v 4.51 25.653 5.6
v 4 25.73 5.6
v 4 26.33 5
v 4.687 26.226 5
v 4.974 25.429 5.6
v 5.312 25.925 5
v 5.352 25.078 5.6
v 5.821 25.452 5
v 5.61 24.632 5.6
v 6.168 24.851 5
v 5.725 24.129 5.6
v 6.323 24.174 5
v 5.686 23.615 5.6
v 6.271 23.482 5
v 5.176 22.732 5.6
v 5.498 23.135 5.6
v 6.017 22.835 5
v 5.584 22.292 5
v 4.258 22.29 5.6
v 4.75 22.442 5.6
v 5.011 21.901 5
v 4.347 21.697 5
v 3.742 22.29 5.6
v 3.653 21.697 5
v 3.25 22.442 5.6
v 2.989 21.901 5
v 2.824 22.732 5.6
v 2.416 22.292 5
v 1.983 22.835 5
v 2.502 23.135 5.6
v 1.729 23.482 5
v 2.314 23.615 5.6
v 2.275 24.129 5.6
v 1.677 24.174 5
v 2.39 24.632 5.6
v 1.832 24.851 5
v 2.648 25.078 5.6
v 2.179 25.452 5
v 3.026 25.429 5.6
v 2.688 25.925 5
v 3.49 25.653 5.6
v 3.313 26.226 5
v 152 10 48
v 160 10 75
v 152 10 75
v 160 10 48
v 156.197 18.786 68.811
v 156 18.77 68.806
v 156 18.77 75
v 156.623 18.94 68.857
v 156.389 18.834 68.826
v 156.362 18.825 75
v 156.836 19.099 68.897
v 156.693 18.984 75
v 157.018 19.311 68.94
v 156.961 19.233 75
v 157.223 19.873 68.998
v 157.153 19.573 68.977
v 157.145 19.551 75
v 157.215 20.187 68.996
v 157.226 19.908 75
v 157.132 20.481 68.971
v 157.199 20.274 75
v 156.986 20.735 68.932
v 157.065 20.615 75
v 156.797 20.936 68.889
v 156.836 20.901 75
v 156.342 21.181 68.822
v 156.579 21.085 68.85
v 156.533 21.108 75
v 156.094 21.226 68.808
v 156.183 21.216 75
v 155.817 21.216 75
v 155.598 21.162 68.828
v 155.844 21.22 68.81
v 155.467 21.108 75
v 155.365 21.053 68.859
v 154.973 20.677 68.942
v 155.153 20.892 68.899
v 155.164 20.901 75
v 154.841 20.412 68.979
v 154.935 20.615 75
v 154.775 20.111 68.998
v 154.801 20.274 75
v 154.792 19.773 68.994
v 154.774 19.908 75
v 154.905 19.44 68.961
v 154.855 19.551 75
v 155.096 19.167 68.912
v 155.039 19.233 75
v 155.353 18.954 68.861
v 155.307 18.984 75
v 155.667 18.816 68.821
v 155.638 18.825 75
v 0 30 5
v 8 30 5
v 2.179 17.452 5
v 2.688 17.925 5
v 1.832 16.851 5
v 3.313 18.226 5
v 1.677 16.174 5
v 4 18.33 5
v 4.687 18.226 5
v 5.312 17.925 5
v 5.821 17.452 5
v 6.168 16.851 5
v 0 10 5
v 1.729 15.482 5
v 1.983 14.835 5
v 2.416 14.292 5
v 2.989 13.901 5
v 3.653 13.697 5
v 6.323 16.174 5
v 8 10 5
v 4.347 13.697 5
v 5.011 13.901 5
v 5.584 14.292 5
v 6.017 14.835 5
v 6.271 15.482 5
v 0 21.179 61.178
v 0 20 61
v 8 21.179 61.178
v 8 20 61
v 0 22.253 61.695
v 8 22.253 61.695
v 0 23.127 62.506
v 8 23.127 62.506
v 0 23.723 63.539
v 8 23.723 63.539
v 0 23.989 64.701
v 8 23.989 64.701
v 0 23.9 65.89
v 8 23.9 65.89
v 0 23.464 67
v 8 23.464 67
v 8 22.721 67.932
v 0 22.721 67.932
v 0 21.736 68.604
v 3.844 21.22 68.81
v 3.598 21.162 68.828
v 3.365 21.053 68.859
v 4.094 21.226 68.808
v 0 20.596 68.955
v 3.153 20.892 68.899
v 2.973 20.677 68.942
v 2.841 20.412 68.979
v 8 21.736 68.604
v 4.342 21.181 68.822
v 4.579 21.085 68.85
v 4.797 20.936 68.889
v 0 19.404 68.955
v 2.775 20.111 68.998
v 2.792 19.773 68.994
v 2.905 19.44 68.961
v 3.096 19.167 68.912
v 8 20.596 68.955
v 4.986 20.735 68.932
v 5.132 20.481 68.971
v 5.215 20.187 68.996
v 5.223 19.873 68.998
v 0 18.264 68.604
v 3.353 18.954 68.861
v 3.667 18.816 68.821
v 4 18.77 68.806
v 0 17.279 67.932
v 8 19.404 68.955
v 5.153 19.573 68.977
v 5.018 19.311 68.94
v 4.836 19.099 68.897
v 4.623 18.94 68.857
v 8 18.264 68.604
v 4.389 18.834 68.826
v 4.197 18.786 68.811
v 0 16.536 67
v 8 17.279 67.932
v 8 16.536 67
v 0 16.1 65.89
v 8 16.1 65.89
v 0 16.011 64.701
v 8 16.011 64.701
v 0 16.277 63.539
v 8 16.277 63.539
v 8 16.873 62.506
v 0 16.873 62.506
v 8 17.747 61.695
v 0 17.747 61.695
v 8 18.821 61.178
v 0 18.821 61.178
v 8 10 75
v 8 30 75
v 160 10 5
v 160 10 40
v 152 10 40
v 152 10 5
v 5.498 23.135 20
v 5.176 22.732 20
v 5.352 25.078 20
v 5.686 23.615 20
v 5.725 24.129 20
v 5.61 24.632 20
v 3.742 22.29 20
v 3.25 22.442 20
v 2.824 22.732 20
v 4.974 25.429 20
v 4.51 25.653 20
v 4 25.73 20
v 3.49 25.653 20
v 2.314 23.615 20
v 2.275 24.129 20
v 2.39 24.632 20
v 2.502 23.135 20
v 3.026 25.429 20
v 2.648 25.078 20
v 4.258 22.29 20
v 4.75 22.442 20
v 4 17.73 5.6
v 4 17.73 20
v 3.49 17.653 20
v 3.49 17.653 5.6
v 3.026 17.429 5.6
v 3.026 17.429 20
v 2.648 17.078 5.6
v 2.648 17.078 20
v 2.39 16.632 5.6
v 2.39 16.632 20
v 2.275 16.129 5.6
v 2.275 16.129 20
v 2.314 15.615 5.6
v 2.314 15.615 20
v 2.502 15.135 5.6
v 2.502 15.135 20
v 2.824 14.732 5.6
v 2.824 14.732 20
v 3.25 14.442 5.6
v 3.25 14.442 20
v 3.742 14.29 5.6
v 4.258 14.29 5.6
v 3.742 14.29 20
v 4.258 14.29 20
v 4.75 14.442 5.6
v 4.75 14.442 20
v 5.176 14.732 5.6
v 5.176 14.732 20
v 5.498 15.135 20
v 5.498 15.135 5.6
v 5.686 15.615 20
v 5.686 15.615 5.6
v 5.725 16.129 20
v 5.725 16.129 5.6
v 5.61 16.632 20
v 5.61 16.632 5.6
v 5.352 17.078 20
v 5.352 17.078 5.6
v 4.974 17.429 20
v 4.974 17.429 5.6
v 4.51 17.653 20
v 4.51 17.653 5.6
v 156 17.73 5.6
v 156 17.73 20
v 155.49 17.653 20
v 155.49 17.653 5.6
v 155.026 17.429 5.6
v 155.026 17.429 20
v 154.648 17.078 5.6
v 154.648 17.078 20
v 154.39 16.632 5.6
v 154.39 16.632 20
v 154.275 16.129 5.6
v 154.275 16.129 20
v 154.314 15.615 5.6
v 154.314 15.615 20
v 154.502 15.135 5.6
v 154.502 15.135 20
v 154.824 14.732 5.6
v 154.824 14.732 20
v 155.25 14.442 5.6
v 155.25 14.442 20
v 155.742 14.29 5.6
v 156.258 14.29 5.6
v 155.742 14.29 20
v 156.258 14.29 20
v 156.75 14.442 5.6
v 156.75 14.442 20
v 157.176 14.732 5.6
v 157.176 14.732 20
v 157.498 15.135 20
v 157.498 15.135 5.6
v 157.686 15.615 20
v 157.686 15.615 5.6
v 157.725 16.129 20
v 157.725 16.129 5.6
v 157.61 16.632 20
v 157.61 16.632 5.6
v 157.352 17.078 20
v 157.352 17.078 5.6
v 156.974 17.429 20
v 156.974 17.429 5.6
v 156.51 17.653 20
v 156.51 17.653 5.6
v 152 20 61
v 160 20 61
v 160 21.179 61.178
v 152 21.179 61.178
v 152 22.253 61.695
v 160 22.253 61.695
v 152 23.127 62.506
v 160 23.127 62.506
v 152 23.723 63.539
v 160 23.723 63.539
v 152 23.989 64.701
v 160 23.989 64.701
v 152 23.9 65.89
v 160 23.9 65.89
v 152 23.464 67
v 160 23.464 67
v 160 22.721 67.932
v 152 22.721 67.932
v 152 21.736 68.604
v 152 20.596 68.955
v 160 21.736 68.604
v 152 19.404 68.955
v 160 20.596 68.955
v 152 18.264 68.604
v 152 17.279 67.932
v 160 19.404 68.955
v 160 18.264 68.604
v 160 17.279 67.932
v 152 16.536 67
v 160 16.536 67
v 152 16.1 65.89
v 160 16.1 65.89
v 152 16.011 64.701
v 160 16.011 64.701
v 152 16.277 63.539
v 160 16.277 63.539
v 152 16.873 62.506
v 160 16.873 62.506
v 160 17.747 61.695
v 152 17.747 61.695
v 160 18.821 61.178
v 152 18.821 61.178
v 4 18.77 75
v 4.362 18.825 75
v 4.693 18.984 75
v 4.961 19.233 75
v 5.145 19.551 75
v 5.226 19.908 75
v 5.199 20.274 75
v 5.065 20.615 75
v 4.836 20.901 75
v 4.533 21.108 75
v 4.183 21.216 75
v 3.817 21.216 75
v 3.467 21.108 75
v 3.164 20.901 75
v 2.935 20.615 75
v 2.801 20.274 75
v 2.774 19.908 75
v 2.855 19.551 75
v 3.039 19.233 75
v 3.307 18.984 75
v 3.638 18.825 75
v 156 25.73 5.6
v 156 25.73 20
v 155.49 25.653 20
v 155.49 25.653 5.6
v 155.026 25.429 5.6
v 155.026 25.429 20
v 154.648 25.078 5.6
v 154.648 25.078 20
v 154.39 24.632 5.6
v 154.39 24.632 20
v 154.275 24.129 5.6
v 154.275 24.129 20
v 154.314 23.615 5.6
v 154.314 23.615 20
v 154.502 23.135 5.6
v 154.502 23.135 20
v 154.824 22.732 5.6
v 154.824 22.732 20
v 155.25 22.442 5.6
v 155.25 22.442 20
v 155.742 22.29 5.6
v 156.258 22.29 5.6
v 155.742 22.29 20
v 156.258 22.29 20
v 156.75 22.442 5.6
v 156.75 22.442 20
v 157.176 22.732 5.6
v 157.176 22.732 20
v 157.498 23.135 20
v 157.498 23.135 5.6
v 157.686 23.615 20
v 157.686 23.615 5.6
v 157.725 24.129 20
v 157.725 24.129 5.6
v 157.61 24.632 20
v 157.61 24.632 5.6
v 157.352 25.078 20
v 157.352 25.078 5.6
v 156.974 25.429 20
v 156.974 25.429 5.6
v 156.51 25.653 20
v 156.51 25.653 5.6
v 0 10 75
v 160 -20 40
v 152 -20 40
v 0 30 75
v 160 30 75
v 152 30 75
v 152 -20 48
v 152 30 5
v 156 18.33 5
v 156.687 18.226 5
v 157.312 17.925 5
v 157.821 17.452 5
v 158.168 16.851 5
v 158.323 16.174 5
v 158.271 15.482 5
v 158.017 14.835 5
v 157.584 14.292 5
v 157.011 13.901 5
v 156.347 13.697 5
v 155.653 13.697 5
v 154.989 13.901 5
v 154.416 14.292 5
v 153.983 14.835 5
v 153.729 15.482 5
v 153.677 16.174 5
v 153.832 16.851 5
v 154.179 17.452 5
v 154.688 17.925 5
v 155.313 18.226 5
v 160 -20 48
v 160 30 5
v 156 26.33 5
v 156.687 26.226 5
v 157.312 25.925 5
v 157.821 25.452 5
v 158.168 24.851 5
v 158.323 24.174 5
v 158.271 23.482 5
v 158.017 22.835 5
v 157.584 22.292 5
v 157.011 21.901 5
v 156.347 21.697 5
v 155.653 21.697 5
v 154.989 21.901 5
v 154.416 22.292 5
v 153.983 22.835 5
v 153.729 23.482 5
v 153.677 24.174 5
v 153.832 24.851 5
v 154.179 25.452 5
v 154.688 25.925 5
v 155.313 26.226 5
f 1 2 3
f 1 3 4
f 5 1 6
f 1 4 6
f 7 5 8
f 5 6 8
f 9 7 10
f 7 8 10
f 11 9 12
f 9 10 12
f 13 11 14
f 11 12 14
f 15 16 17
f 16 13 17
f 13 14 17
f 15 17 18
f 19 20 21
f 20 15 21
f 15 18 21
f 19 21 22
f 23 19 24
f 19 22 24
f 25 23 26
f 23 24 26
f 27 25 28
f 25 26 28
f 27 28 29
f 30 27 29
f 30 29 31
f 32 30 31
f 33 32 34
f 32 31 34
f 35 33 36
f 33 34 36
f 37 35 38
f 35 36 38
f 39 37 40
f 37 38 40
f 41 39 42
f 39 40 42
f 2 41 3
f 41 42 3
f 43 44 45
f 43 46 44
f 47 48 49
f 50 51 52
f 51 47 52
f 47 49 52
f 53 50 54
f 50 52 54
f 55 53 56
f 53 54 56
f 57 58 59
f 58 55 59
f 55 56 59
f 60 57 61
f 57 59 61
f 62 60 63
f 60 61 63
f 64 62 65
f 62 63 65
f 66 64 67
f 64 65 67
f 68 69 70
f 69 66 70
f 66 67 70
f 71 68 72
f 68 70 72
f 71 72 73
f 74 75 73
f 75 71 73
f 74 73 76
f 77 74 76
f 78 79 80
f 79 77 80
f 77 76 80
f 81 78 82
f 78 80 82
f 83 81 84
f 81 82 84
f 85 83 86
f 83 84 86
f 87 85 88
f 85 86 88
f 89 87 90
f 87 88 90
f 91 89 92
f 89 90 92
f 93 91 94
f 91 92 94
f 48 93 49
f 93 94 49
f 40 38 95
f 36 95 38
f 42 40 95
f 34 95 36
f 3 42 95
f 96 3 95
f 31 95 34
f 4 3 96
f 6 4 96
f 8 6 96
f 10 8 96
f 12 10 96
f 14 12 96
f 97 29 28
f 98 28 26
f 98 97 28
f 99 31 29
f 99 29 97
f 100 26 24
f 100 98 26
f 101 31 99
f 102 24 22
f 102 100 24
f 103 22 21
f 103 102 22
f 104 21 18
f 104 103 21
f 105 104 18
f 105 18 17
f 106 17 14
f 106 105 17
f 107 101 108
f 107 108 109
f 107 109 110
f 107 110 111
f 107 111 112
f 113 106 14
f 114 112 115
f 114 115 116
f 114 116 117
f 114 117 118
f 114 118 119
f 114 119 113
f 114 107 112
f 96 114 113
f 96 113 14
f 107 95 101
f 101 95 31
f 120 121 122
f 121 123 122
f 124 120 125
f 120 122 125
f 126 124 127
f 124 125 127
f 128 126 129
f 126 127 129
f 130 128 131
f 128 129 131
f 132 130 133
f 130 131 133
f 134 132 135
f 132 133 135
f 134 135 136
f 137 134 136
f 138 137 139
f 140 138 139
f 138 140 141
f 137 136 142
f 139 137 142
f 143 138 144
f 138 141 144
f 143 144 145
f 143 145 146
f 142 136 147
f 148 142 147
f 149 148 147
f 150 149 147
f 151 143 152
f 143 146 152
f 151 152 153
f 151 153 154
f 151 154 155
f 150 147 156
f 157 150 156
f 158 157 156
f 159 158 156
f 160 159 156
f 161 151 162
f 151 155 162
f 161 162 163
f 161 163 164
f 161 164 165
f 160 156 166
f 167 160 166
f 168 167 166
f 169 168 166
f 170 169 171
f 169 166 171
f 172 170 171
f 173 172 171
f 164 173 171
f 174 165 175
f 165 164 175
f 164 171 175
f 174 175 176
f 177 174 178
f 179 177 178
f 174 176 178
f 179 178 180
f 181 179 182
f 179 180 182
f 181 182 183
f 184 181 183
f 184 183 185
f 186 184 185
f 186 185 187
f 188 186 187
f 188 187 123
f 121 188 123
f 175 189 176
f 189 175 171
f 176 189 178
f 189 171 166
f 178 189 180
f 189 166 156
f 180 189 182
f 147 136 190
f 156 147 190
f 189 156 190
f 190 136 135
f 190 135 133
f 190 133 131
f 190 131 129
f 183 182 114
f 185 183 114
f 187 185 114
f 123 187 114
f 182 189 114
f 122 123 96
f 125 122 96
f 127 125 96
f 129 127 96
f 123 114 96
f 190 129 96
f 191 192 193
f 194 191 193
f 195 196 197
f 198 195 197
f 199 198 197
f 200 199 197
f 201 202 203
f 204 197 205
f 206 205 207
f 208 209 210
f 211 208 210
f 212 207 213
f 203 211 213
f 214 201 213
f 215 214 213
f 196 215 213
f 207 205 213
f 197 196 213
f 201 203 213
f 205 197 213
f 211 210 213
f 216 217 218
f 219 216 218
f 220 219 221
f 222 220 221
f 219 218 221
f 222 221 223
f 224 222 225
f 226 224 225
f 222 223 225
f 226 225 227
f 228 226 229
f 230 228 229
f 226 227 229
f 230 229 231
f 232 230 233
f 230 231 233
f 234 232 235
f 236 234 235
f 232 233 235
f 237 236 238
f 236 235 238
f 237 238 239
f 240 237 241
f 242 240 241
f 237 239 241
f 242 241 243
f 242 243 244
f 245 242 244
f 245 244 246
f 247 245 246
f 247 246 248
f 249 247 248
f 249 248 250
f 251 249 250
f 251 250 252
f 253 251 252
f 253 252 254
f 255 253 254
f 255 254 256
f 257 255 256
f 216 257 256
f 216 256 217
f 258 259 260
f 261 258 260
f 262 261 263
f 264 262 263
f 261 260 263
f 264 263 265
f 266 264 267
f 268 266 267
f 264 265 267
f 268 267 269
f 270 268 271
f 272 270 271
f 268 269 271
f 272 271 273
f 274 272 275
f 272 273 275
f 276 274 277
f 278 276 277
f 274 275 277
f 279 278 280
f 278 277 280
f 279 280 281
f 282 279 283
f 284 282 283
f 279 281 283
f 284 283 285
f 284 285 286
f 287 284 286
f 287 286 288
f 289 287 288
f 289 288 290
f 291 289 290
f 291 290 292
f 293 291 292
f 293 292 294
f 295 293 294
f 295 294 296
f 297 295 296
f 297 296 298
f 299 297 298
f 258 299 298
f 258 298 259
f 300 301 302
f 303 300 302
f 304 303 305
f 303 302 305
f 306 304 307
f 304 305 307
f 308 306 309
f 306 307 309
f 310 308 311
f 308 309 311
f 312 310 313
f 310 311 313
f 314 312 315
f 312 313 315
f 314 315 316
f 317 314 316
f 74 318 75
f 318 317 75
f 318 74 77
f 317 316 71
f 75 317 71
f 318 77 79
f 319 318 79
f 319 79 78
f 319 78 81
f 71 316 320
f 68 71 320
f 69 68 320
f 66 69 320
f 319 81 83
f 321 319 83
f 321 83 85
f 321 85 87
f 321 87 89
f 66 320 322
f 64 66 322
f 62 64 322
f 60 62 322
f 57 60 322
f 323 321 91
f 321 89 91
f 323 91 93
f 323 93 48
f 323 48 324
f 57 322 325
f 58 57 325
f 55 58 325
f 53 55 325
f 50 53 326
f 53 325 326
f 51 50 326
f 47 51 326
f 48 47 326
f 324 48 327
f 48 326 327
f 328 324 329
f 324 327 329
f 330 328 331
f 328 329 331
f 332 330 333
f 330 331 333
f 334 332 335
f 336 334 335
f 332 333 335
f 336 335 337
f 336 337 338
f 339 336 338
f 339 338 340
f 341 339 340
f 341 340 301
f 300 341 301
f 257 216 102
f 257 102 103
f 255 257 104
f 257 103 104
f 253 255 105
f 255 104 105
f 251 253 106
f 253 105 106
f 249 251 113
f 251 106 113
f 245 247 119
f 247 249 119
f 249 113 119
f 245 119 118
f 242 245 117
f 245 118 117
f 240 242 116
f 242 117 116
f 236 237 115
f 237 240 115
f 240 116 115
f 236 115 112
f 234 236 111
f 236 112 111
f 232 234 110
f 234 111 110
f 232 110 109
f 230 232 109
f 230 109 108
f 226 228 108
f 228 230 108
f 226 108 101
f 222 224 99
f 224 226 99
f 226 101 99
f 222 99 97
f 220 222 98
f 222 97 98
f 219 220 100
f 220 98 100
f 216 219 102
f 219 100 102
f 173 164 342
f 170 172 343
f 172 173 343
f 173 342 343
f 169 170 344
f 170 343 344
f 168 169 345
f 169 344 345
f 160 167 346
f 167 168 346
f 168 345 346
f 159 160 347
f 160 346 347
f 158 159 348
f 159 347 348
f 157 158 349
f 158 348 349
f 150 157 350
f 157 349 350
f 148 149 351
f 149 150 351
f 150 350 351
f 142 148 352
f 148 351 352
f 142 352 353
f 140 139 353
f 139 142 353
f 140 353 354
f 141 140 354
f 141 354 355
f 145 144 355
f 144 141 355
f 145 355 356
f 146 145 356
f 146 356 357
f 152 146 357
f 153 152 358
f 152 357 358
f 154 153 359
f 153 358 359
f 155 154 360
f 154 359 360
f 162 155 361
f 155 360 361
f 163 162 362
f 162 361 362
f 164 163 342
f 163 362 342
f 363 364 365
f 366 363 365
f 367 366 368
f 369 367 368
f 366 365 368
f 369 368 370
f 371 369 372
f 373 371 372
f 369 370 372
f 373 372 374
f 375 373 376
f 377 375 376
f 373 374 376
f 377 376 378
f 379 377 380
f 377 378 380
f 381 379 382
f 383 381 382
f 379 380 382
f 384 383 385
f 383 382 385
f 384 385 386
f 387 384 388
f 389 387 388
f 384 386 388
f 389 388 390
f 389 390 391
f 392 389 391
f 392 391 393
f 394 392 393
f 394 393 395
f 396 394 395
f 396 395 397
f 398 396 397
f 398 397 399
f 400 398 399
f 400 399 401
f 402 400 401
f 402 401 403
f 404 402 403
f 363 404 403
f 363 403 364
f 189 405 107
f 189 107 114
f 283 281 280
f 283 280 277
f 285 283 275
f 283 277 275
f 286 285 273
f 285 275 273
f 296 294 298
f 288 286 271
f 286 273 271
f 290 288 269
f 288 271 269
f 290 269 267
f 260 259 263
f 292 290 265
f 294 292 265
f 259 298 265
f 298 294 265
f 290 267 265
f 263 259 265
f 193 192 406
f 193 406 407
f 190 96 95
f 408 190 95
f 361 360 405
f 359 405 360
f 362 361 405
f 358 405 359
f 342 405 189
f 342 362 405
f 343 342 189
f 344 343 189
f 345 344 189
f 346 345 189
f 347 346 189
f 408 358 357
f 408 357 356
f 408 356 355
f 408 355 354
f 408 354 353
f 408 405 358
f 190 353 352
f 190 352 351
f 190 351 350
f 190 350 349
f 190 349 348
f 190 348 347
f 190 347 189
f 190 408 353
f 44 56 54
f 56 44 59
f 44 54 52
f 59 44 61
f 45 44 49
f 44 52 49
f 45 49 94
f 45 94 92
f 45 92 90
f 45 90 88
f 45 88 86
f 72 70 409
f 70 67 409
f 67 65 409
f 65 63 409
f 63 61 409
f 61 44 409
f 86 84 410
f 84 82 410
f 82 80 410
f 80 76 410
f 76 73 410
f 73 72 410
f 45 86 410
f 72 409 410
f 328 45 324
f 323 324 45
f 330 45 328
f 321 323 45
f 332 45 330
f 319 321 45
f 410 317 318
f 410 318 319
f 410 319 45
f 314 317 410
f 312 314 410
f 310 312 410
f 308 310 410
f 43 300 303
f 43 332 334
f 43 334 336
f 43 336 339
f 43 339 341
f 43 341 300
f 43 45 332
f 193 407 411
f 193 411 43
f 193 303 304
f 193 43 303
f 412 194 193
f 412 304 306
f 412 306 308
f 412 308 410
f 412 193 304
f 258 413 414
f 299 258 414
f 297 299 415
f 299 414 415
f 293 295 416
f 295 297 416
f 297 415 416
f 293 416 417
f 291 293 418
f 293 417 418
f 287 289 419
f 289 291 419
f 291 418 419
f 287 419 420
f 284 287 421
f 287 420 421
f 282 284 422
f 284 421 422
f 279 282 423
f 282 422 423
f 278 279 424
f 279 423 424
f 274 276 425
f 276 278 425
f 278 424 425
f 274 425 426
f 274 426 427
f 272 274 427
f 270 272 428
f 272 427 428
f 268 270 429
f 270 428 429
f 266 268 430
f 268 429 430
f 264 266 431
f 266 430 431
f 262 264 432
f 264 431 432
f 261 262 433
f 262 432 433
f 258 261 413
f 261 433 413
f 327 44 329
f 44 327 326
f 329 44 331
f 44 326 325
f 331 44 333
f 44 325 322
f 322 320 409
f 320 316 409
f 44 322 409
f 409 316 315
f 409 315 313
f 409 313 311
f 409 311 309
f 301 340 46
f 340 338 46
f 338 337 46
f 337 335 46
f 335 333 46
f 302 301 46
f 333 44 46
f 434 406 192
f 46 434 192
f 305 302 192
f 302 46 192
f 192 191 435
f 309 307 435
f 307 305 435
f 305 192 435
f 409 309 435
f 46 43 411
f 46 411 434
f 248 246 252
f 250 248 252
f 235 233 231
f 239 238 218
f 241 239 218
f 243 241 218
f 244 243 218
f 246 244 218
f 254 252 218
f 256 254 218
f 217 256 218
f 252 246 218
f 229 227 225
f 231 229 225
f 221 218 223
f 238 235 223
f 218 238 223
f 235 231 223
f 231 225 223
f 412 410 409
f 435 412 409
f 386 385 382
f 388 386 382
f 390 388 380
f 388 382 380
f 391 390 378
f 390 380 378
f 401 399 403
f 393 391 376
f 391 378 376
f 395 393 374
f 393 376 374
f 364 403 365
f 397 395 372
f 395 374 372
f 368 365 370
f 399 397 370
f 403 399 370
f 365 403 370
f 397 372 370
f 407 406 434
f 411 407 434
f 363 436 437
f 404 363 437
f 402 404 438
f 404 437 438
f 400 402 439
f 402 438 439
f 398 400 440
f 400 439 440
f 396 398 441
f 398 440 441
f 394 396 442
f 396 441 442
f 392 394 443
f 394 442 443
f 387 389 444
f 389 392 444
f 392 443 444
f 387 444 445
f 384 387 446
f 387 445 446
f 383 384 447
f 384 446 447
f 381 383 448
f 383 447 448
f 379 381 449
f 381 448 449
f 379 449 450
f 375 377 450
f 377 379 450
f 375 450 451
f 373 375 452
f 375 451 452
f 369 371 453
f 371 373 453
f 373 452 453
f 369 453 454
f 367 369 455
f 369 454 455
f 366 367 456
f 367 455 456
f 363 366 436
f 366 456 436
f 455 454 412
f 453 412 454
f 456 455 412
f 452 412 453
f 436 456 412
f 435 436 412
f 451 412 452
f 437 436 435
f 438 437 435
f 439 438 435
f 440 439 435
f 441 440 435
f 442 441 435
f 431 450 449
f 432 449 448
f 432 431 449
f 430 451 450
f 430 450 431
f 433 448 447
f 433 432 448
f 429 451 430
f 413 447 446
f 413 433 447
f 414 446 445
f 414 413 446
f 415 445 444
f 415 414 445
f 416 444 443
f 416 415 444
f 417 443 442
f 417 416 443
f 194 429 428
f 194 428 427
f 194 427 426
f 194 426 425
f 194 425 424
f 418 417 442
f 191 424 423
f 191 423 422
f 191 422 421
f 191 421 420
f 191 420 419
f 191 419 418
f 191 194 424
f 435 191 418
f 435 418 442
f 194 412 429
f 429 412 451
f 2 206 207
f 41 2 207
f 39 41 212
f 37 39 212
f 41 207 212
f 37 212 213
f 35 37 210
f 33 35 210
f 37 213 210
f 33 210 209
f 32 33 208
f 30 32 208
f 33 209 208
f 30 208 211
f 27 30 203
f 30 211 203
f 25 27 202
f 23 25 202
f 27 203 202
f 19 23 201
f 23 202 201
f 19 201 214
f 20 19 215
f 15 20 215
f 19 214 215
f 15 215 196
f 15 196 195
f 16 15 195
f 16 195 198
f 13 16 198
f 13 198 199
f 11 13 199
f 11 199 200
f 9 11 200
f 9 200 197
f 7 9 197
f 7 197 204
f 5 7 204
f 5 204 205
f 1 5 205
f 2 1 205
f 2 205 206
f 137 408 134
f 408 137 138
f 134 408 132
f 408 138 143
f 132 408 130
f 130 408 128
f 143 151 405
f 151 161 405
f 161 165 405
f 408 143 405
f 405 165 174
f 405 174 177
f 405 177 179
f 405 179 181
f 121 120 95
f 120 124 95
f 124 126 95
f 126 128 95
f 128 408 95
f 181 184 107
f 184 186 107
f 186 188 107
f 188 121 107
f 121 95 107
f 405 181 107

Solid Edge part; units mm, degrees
sketch "Sketch1" plane through (0, 0, 0) normal (0, 0, 1) x (1, 0, 0)
  line L0 (160, 0) -> (160, 40)
  line L1 (160, 40) -> (0, 40)
  line L2 (0, 40) -> (0, 0)
  line L3 (0, 0) -> (160, 0)
extrude "Protrusion1" add sketch "Sketch1" along normal blind 5
sketch "Sketch2" plane through (75, 20, 5) normal (0, 0, 1) x (1, 0, 0)
  line L0 (77, 10) -> (85, 10)
  line L1 (85, 10) -> (85, -10)
  line L2 (85, -10) -> (77, -10)
  line L3 (77, -10) -> (77, 10)
  line L4 (-67, -10) -> (-67, 10)
  line L5 (-67, 10) -> (-75, 10)
  line L6 (-75, 10) -> (-75, -10)
  line L7 (-75, -10) -> (-67, -10)
  dimension "D1" = 8
  dimension "D2" = 10
  dimension "D3" = 10
  dimension "D4" = 20
  dimension "D5" = 10
  dimension "D6" = 20
  dimension "D7" = 10
  dimension "D8" = 8
extrude "ExtrudedProtrusion_2" add sketch "Sketch2" along normal blind 70
hole "Hole1" at (20, 10, 5) direction (0, 0, -1) diameter 4.2 end up to next start chamfer 1 start chamfer angle 45
hole "Hole2" at (140, 10, 5) direction (0, 0, -1) diameter 4.2 end up to next start chamfer 1 start chamfer angle 45
hole "Hole3" at (140, 30, 5) direction (0, 0, -1) diameter 4.2 end up to next start chamfer 1 start chamfer angle 45
hole "Hole4" at (20, 30, 5) direction (0, 0, -1) diameter 4.2 end up to next start chamfer 1 start chamfer angle 45
hole "Bohrung_6" at (160, 20, 65) direction (-1, 0, 0) diameter 8 end through all
hole "Hole_7" at (156, 20, 75) direction (0, 0, -1) diameter 2.459 end up to next thread major 3 thread length 2
hole "Hole5" at (4, 20, 75) direction (0, 0, -1) diameter 2.459 end up to next thread major 3 thread length 2
sketch "Sketch3" plane through (80, 0, 2.5) normal (0, -1, 0) x (1, 0, 0)
  line L0 (-80, -2.5) -> (-80, 2.5)
  line L1 (-80, 2.5) -> (80, 2.5)
  line L2 (80, 2.5) -> (80, -2.5)
  line L3 (80, -2.5) -> (-80, -2.5)
extrude "Cutout1" cut sketch "Sketch3" against normal through all
hole "Hole_10" at (156, 16, 5) direction (0, 0, 1) diameter 3.459 depth 15 start chamfer 0.6 start chamfer angle 45 thread major 4 thread length 2
hole "Hole6" at (156, 24, 5) direction (0, 0, 1) diameter 3.459 depth 15 start chamfer 0.6 start chamfer angle 45 thread major 4 thread length 2
hole "Hole_12" at (4, 24, 5) direction (0, 0, 1) diameter 3.459 depth 15 start chamfer 0.6 start chamfer angle 45 thread major 4 thread length 2
hole "Hole7" at (4, 16, 5) direction (0, 0, 1) diameter 3.459 depth 15 start chamfer 0.6 start chamfer angle 45 thread major 4 thread length 2
sketch "Sketch4" plane through (156, 10, 40) normal (0, -1, 0) x (0, 0, 1)
  line L0 (0, 4) -> (8, 4)
  line L1 (8, 4) -> (8, -4)
  line L2 (8, -4) -> (0, -4)
  line L3 (0, -4) -> (0, 4)
  dimension "D1" = 8
  dimension "D2" = 8
extrude "ExtrudedProtrusion_4" add sketch "Sketch4" along normal blind 30
